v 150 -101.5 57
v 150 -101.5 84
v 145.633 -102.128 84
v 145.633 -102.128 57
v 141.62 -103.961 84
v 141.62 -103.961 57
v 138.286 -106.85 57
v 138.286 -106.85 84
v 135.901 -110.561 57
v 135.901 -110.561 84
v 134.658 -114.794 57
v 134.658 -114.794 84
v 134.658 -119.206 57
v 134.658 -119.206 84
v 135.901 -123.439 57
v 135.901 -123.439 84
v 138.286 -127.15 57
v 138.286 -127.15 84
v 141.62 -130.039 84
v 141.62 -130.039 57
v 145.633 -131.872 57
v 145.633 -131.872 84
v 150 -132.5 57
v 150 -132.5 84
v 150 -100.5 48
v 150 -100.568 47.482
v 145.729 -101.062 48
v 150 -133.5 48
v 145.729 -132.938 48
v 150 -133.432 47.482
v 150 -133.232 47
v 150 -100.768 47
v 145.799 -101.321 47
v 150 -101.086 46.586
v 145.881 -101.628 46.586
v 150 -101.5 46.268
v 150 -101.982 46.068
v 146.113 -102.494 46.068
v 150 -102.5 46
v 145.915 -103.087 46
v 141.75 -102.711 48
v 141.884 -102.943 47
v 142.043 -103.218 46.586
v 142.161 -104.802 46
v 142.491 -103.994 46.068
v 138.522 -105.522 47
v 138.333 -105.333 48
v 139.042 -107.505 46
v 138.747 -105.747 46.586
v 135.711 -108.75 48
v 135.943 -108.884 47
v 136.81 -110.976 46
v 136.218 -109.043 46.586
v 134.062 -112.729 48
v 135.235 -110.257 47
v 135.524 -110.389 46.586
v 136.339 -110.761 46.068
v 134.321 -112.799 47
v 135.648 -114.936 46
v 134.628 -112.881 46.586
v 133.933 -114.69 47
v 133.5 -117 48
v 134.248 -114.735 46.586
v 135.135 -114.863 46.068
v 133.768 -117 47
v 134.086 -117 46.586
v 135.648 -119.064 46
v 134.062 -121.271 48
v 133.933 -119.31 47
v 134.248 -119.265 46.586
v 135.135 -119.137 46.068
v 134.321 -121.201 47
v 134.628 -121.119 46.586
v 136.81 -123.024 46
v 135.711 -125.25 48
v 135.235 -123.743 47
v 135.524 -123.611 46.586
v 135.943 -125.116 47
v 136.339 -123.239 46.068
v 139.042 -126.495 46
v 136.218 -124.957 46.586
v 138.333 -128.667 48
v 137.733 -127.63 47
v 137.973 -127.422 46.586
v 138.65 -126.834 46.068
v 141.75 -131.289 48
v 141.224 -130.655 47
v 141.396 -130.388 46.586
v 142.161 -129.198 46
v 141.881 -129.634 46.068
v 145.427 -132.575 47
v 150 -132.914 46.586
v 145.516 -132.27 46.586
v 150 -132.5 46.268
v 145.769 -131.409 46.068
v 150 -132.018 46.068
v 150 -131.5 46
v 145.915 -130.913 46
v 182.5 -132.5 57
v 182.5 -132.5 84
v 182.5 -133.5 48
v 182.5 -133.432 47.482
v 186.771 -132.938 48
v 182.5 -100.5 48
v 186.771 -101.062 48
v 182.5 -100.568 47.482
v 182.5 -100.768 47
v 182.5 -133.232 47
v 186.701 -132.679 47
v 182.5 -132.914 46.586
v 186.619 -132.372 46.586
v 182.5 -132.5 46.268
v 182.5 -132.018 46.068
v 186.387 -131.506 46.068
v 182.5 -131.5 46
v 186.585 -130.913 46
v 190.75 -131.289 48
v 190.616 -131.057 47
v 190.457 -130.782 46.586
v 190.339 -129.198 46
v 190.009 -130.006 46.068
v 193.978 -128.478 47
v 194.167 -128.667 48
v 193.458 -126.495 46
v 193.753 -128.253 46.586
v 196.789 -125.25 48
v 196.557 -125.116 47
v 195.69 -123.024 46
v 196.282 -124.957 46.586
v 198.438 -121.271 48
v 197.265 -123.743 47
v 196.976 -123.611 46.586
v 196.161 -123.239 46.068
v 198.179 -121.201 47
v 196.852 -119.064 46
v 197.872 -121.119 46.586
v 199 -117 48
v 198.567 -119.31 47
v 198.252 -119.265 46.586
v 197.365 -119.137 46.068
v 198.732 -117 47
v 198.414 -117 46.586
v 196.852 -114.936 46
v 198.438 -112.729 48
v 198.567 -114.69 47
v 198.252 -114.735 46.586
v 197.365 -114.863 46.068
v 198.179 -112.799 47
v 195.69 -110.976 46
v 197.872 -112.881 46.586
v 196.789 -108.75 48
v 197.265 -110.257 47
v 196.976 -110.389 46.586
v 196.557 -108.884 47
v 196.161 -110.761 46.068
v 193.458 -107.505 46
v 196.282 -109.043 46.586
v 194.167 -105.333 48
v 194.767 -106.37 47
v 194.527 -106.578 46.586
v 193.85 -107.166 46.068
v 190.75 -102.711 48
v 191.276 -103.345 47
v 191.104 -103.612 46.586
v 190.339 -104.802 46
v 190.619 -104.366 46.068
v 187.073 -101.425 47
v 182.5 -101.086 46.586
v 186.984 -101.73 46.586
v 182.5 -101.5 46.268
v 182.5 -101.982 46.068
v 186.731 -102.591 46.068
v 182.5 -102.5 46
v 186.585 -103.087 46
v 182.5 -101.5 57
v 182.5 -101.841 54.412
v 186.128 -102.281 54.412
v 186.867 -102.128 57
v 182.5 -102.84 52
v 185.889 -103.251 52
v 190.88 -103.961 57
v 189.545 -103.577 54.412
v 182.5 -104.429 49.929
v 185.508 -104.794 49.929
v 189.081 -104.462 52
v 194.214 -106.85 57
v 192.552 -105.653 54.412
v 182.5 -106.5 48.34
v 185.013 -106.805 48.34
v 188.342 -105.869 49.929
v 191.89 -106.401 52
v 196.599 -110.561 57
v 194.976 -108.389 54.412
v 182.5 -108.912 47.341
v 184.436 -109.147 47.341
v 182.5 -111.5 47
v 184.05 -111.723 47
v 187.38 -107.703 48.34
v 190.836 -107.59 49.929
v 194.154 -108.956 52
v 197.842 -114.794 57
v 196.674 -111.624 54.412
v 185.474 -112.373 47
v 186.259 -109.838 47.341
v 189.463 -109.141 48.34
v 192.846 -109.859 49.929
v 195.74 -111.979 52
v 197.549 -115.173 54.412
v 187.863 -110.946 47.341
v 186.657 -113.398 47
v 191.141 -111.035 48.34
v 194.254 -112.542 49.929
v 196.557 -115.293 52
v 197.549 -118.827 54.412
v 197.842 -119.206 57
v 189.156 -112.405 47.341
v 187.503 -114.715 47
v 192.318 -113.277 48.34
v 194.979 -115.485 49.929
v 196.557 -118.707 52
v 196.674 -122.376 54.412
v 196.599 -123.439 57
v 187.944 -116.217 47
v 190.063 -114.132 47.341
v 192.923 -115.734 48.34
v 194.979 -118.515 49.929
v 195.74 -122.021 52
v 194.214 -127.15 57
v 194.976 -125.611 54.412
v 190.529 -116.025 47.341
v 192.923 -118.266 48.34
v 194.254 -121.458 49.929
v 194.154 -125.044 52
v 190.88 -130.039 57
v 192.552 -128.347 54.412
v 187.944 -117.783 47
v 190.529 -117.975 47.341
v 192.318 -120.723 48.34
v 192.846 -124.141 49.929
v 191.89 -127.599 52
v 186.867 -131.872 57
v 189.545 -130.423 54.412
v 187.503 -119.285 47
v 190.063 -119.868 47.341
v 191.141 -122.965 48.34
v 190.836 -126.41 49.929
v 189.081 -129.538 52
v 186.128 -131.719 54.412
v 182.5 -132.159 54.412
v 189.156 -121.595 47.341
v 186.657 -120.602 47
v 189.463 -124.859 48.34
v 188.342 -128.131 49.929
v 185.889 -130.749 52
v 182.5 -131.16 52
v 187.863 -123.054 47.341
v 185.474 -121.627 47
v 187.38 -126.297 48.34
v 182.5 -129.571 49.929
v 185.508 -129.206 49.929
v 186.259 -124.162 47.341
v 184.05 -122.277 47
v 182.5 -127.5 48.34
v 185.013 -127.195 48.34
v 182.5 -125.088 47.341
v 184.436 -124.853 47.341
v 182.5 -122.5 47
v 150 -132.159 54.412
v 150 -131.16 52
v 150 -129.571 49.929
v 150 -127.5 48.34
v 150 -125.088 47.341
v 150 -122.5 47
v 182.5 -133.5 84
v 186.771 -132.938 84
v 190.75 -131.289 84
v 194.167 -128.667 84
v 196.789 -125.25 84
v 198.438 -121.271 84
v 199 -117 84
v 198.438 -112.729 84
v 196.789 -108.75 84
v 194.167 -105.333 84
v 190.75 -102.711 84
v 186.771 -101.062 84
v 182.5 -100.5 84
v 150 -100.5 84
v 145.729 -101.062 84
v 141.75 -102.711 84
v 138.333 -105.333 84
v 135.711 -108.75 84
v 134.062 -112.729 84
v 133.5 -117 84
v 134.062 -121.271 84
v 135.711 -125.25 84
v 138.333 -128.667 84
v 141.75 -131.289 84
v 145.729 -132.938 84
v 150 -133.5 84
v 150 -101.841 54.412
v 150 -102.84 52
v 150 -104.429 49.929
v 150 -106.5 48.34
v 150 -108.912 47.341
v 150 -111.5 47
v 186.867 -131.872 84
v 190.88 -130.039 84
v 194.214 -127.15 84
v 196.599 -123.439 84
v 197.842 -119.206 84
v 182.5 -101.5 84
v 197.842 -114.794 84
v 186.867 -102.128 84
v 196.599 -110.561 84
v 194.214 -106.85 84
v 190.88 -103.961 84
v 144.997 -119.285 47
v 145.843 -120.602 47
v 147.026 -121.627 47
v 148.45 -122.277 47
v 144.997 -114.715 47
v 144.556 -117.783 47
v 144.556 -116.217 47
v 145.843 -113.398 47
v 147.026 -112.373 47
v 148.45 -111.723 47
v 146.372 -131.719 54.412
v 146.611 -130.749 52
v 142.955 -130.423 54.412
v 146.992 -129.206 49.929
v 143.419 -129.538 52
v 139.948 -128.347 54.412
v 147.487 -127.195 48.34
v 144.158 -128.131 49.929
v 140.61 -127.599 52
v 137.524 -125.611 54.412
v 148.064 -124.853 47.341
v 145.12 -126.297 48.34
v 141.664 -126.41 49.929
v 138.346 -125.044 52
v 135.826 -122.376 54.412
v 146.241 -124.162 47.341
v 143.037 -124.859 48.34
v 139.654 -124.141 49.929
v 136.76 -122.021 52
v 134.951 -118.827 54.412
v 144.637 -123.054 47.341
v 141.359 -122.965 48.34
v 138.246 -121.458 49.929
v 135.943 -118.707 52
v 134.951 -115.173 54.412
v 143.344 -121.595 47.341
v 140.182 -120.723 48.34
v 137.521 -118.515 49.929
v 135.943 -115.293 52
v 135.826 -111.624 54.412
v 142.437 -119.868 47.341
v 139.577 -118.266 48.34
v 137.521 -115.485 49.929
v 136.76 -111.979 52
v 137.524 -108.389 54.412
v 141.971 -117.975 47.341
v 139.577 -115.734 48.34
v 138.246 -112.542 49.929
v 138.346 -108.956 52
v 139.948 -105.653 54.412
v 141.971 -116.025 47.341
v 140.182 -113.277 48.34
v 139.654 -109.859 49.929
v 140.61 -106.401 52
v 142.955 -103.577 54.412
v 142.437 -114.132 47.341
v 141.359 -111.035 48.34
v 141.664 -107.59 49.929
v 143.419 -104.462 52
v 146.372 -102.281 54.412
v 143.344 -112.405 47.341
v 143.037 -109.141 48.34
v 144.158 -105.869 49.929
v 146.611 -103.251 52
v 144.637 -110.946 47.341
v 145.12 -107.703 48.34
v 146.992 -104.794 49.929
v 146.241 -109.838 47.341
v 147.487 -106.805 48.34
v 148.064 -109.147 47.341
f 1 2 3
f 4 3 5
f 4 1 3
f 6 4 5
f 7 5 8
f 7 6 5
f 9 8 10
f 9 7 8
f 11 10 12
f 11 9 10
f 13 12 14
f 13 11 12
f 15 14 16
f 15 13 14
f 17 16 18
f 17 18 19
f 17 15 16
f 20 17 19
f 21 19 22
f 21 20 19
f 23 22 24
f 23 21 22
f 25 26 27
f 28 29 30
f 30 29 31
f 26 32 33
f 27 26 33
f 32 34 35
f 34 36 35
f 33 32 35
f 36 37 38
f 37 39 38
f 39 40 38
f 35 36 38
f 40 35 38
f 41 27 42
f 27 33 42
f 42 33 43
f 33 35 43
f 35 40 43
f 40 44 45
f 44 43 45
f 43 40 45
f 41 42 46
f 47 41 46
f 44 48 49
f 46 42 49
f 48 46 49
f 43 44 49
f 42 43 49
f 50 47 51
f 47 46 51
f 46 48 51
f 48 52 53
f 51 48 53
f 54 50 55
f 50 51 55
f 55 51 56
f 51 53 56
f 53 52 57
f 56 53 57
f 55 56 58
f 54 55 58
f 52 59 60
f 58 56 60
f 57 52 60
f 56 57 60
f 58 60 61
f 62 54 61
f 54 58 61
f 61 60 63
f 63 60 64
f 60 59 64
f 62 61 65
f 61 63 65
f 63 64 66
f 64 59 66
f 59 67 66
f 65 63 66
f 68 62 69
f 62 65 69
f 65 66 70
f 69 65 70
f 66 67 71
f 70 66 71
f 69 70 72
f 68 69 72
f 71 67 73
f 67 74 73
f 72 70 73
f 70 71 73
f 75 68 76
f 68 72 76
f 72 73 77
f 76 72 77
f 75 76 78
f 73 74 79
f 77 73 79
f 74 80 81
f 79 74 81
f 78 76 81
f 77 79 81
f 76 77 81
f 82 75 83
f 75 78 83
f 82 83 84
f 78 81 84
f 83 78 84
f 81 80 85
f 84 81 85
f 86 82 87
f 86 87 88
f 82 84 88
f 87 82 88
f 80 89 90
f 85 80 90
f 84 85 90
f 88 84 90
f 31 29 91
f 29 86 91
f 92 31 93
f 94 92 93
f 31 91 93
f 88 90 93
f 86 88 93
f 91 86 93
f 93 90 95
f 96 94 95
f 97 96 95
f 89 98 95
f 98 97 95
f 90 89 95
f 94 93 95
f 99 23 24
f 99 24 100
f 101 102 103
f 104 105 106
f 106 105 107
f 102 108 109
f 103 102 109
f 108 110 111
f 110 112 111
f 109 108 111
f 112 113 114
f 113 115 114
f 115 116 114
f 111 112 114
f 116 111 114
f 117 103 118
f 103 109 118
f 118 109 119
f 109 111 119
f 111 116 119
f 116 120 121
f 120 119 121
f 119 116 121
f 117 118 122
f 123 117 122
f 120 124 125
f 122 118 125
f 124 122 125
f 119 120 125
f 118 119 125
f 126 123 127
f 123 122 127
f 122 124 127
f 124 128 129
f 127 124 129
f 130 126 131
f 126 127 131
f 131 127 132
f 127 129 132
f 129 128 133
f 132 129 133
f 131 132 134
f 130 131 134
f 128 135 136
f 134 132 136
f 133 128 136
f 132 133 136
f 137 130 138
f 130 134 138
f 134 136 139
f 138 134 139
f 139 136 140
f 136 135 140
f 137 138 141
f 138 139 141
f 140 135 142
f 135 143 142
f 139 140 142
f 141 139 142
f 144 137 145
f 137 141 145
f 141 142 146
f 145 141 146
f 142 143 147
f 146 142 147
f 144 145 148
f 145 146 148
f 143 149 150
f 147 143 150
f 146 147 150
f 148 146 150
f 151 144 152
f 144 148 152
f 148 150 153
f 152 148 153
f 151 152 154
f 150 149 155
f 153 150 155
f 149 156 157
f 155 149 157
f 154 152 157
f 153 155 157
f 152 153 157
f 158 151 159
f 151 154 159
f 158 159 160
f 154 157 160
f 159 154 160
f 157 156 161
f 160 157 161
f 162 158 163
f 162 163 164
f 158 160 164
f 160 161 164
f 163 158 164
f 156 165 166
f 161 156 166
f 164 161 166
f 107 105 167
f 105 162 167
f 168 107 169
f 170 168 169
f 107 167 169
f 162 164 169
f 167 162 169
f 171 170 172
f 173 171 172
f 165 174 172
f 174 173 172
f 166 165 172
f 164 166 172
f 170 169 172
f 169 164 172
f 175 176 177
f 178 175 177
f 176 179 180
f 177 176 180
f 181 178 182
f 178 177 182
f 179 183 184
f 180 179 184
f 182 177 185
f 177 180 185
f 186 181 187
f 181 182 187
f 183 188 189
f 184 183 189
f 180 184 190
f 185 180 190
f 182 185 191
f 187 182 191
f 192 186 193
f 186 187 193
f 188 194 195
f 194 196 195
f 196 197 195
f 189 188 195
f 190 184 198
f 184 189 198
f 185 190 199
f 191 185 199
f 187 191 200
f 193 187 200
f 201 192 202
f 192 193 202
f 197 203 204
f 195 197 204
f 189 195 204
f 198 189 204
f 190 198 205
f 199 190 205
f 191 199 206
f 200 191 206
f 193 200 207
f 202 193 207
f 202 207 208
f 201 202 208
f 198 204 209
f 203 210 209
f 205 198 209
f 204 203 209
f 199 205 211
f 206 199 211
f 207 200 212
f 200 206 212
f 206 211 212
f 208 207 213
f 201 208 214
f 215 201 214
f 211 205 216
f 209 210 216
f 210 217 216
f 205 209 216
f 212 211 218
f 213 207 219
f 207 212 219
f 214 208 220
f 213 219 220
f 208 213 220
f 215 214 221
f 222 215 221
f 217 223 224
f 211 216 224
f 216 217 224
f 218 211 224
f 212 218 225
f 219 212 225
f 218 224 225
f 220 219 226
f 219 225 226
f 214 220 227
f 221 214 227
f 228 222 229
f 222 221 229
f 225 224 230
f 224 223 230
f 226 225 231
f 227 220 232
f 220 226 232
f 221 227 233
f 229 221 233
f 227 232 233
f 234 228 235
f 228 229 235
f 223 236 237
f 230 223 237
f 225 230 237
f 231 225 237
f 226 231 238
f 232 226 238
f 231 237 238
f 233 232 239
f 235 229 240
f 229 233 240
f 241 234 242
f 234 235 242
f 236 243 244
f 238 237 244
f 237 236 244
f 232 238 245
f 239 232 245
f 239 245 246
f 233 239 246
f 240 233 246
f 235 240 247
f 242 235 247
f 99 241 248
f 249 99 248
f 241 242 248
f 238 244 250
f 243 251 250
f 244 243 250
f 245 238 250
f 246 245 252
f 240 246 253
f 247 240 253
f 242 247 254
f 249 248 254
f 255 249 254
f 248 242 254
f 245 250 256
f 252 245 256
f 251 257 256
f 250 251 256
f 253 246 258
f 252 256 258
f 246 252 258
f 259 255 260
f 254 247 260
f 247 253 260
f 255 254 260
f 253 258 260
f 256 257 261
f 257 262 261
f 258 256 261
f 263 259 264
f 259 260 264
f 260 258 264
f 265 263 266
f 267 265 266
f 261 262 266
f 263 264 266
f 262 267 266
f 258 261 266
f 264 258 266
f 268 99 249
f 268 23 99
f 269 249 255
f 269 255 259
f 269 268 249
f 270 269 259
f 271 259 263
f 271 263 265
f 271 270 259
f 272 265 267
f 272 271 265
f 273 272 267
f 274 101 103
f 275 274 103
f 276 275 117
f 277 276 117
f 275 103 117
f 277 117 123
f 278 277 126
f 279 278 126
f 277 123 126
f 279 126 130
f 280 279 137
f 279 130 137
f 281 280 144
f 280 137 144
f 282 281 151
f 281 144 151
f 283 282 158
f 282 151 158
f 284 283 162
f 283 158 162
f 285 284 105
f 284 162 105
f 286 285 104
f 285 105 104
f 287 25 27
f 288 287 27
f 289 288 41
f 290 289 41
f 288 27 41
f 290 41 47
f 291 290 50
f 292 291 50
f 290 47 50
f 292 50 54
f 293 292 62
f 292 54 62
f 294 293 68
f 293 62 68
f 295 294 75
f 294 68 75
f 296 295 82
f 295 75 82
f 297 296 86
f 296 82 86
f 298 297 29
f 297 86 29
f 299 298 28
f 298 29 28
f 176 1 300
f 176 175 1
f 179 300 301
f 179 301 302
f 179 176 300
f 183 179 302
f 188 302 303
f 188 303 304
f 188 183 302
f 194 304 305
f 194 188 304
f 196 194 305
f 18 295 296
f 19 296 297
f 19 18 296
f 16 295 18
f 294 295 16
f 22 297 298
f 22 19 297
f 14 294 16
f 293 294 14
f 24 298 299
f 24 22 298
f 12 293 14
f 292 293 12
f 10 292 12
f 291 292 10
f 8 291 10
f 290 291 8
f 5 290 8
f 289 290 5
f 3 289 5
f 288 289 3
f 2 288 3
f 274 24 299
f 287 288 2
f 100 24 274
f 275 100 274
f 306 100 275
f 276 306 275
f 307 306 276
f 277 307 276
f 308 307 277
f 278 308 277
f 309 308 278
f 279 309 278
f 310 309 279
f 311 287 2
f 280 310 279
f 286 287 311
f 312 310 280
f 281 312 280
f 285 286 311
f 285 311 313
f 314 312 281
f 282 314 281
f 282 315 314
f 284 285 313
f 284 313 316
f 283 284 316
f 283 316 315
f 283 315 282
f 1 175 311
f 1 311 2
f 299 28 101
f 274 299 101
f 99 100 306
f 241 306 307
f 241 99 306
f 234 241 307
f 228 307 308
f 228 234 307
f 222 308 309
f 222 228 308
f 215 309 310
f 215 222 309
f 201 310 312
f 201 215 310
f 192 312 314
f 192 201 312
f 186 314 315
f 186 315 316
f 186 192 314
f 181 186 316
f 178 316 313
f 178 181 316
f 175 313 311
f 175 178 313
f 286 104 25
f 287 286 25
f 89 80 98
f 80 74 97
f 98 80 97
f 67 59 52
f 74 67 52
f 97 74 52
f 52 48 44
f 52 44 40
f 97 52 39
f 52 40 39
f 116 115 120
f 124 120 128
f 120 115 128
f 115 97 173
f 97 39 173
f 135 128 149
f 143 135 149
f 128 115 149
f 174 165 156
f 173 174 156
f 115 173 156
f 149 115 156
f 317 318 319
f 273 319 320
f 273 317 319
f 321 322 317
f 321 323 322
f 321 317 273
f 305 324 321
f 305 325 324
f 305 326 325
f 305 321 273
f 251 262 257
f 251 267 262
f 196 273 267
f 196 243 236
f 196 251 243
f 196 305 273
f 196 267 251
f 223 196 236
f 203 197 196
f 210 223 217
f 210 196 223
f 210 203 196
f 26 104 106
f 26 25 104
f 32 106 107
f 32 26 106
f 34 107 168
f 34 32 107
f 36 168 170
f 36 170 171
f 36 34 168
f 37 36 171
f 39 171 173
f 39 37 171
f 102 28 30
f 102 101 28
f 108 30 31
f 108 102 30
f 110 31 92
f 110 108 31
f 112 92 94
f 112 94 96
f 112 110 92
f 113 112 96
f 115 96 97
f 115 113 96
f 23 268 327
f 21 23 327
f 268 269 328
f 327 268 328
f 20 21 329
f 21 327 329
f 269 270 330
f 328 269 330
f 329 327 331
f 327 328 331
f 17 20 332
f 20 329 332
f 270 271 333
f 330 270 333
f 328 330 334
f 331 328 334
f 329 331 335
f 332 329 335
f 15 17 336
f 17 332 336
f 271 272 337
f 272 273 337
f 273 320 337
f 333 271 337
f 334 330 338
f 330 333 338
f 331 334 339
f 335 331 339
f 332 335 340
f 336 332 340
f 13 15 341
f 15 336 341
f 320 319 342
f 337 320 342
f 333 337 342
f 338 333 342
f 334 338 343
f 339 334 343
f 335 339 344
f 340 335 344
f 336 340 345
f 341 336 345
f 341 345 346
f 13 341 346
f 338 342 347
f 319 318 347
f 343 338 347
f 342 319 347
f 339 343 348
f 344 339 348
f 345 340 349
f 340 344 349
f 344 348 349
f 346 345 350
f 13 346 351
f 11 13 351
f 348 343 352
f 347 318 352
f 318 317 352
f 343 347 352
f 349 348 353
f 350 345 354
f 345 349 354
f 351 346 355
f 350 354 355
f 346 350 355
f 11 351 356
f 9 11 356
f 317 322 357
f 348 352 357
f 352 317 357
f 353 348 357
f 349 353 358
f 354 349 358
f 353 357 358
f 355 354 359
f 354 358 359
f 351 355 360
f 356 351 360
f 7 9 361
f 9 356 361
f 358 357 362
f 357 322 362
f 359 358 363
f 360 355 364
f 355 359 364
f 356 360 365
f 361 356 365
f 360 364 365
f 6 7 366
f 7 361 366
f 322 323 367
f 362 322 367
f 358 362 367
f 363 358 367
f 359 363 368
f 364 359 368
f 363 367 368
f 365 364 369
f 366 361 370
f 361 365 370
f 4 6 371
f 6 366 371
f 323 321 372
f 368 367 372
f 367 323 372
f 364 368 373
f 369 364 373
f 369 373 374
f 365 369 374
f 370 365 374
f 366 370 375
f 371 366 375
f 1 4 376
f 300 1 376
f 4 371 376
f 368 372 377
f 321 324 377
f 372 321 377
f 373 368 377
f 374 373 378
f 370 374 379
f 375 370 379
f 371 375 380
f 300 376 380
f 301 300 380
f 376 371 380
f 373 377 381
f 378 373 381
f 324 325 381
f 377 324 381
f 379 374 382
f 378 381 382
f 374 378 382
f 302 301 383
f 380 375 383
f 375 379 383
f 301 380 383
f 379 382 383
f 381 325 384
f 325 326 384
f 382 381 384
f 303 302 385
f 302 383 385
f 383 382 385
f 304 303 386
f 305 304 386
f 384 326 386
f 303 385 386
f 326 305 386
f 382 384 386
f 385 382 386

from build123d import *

# Parameters (mm, degrees)
PAD002_DEPTH = 38
THICKNESS_T  = -1
FILLET002_R  = 10
FILLET003_R  = 2


with BuildPart() as part:
    # Sketch007 → Pad002 (new body)
    with BuildSketch(Plane.XY):
        with BuildLine():
            ThreePointArc((-83, 72.5), (-99.5, 56), (-83, 39.5))
            Line((-83, 39.5), (-50.5, 39.5))
            ThreePointArc((-50.5, 39.5), (-34, 56), (-50.5, 72.5))
            Line((-50.5, 72.5), (-83, 72.5))
        make_face()
    extrude(amount=PAD002_DEPTH)

    # Thickness
    thickness_openings = [part.faces().sort_by_distance(p)[0] for p in [
        (-66.75, 56, 38),
    ]]
    offset(amount=THICKNESS_T, openings=thickness_openings)

    # Fillet002
    fillet002_edges = [part.edges().sort_by_distance(p)[0] for p in [
        (-98.5, 56, 1),
        (-66.75, 40.5, 1),
        (-35, 56, 1),
        (-66.75, 71.5, 1),
    ]]
    fillet(fillet002_edges, radius=FILLET002_R)

    # Fillet003
    fillet003_edges = [part.edges().sort_by_distance(p)[0] for p in [
        (-99.5, 56, 0),
        (-66.75, 39.5, 0),
        (-34, 56, 0),
        (-66.75, 72.5, 0),
    ]]
    fillet(fillet003_edges, radius=FILLET003_R)


with BuildPart() as part_1:
    # Body002 placement: moved
    add(part.part.moved(Location((233, -173, 46))))


solid = part_1.part
